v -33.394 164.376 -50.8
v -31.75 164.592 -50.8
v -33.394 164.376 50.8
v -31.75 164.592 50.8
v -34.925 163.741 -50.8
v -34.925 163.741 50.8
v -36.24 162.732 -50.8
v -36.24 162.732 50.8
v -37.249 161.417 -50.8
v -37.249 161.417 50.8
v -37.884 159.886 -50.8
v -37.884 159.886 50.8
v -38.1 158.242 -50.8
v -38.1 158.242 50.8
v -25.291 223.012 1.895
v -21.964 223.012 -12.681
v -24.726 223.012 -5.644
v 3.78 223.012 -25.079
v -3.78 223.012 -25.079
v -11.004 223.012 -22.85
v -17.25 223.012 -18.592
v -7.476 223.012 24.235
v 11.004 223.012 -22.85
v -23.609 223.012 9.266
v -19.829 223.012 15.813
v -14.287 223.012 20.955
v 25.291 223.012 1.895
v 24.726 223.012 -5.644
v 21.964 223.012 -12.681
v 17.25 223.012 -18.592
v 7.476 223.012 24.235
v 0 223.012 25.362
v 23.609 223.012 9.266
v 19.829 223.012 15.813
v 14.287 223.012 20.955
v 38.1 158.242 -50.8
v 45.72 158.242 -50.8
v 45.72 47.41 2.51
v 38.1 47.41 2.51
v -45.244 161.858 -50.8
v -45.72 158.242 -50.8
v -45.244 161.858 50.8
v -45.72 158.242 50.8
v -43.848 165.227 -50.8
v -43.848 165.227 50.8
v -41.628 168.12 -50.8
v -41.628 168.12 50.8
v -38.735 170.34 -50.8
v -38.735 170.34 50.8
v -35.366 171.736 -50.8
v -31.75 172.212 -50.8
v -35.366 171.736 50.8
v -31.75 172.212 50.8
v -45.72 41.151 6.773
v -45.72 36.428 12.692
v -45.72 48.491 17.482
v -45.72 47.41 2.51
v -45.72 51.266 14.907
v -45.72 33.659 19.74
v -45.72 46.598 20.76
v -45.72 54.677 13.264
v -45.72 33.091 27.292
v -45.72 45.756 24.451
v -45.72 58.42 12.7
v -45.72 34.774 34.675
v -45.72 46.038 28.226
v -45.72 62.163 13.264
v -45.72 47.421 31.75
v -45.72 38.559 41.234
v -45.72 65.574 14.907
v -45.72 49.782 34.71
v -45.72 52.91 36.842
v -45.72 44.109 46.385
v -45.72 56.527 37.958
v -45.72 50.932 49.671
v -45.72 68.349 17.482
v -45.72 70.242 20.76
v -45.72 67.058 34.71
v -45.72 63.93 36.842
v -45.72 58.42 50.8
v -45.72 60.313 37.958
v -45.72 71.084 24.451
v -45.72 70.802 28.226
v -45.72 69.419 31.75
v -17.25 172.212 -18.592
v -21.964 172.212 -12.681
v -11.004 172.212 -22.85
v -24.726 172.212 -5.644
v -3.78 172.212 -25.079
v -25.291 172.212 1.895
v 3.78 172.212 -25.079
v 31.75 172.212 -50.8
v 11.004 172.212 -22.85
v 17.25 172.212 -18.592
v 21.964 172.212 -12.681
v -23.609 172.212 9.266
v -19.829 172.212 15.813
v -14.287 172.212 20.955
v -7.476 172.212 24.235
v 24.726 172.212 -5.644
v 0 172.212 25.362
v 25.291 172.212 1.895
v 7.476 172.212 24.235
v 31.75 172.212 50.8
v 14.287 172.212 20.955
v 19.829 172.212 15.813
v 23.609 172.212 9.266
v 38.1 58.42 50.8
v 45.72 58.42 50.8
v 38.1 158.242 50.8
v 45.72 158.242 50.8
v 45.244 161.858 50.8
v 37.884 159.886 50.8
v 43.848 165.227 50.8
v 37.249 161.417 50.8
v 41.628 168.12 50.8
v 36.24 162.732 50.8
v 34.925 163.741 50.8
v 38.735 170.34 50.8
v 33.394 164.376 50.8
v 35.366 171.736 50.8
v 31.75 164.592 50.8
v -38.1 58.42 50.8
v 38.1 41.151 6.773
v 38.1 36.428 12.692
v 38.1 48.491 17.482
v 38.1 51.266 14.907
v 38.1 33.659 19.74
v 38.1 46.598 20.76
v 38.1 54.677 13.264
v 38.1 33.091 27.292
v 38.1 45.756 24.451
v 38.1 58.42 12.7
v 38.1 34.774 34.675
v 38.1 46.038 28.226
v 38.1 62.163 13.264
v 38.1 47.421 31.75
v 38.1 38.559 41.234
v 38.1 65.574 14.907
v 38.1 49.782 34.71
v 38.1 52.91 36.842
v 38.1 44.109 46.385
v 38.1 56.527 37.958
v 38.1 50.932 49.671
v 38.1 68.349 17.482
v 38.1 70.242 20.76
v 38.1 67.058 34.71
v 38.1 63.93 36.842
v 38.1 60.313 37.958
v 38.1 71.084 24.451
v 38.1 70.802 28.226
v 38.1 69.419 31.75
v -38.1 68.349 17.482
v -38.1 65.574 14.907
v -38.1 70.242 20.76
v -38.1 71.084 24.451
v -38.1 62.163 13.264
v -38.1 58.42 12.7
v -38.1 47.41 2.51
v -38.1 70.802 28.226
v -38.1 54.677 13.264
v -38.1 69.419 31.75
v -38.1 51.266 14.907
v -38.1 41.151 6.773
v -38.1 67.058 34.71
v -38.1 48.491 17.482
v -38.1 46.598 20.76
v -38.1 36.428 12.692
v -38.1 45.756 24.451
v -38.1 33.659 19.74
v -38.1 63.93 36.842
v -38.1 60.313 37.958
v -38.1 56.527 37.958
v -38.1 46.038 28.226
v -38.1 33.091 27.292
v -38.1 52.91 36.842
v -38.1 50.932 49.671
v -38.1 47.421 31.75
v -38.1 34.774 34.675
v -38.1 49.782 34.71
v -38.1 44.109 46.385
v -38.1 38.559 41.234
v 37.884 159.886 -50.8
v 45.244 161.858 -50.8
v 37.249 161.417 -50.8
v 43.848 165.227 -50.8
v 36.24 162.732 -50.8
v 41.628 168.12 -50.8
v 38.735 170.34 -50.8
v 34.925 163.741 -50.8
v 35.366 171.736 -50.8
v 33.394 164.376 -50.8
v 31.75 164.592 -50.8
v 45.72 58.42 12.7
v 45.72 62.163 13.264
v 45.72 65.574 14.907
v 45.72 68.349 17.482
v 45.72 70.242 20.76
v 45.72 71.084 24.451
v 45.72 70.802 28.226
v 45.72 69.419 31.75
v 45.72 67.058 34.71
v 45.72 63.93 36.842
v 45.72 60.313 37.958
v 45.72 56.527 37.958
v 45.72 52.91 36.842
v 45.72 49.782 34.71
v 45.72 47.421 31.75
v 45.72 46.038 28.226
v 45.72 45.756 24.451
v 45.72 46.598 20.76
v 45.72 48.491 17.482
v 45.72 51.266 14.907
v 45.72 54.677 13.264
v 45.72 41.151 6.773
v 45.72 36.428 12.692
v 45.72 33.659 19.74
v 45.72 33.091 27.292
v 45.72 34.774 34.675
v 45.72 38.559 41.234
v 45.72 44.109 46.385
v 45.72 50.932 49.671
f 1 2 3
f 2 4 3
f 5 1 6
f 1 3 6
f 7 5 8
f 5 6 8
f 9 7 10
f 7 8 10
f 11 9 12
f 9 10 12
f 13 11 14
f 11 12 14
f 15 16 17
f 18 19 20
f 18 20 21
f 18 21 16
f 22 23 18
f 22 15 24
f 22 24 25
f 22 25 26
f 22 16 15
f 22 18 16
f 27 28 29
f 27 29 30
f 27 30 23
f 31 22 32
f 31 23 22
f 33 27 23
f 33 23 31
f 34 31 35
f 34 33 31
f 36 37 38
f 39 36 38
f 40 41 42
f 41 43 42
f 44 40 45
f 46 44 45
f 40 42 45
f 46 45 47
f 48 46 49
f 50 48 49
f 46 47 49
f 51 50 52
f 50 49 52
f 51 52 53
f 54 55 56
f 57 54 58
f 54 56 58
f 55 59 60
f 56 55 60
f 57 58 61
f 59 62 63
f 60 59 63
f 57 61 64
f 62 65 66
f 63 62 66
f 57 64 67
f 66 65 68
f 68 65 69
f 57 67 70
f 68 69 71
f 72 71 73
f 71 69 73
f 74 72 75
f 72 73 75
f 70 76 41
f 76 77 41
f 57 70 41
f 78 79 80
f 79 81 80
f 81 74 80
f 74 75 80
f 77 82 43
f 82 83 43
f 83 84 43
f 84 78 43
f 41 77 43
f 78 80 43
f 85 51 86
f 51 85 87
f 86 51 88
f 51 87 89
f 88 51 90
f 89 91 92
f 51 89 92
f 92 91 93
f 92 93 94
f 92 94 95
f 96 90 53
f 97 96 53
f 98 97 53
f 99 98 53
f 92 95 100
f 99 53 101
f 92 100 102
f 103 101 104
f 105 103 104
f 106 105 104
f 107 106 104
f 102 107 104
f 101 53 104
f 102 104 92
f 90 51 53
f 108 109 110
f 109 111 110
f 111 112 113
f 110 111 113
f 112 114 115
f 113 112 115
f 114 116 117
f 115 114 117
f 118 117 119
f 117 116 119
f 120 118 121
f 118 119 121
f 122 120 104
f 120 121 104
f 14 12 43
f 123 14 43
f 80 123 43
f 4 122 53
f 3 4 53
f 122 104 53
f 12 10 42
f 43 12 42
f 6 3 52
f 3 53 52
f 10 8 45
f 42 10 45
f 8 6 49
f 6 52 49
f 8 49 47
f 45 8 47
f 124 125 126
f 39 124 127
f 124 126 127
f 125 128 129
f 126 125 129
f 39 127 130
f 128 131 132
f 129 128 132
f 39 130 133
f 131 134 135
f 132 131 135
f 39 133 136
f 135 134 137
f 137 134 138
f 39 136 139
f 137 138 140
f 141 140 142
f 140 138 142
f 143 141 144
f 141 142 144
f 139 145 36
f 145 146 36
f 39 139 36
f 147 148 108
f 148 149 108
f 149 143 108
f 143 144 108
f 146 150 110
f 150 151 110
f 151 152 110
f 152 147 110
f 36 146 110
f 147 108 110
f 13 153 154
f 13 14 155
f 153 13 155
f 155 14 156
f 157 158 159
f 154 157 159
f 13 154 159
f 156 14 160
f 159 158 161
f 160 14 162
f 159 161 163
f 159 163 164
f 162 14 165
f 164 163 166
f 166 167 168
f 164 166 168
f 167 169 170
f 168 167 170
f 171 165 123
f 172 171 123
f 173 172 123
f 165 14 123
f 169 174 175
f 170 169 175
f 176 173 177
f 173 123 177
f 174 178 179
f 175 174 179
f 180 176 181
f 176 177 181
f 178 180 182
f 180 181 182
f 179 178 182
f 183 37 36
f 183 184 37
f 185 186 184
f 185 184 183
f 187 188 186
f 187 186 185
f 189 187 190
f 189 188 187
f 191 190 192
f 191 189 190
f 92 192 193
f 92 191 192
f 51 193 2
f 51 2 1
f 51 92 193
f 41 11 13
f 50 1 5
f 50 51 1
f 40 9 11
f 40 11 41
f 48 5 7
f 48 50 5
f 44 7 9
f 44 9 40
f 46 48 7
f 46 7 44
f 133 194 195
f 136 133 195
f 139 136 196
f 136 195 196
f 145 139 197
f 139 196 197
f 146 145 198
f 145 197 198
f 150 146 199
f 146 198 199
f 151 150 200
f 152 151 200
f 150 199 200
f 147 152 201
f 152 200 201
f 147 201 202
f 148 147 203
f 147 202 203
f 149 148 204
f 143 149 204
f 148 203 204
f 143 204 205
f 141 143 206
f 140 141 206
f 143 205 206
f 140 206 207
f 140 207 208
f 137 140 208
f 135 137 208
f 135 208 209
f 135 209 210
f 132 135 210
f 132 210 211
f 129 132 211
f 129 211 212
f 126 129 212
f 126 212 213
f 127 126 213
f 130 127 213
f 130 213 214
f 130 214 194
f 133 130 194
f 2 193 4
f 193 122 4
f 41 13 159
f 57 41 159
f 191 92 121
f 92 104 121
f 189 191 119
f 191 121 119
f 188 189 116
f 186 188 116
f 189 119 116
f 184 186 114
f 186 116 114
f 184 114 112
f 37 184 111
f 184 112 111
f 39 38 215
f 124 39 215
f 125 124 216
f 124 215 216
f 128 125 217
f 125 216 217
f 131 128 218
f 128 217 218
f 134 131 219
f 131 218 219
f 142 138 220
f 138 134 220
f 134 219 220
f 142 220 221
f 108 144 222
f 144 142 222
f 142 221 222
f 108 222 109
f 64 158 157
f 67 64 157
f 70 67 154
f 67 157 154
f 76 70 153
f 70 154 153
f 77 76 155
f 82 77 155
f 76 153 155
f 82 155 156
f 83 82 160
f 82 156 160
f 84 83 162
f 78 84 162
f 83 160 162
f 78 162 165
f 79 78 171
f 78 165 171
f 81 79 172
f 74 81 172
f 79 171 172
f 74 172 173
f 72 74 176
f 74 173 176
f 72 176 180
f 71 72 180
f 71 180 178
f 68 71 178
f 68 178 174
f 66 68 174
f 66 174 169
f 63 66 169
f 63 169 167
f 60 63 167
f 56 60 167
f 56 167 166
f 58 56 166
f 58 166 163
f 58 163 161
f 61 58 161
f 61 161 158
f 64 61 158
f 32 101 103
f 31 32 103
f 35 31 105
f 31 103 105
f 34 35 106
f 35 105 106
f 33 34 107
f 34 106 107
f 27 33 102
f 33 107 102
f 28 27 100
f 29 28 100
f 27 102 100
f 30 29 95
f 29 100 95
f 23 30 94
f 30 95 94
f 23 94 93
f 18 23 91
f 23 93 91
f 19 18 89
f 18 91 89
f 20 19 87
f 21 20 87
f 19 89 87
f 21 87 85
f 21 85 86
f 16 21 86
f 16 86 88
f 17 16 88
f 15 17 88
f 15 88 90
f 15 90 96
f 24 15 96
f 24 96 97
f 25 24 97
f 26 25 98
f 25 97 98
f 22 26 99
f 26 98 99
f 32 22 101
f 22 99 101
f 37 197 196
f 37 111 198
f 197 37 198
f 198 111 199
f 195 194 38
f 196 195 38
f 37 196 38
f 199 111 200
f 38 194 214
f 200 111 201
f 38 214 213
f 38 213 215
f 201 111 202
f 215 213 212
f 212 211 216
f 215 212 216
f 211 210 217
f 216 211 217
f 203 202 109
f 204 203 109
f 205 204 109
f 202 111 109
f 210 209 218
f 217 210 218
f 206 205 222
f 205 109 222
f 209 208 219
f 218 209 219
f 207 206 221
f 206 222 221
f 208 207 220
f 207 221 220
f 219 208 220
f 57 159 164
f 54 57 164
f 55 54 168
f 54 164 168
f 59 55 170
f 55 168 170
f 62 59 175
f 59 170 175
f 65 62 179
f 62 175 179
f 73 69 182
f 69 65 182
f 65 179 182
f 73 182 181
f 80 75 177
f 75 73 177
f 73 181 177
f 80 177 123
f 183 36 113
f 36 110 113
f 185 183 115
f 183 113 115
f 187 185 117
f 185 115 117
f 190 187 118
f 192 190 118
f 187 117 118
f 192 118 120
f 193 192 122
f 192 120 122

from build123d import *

# Parameters (mm, degrees)
BASE_FLANGE1_DEPTH  = 50.8
SKETCH8_R           = 12.7
CUT_EXTRUDE2_DEPTH  = 202.491653782
SKETCH9_R           = 25.36182522
BOSS_EXTRUDE1_DEPTH = 50.8


# Sheet-metal steps are written as plain solids
with BuildPart() as part:
    # Sketch2 → Base-Flange1 (new, symmetric)
    with BuildSketch(Plane.XY):
        with BuildLine():
            Line((38.1, 0), (38.1, 158.242))
            ThreePointArc((38.1, 158.242), (36.240128061, 162.732128061), (31.75, 164.592))
            Line((31.75, 164.592), (-31.75, 164.592))
            ThreePointArc((-31.75, 164.592), (-36.240128061, 162.732128061), (-38.1, 158.242))
            Line((-38.1, 158.242), (-38.1, 0))
            Line((-38.1, 0), (-45.72, 0))
            Line((-45.72, 0), (-45.72, 158.242))
            ThreePointArc((-45.72, 158.242), (-41.628281733, 168.120281733), (-31.75, 172.212))
            Line((-31.75, 172.212), (31.75, 172.212))
            ThreePointArc((31.75, 172.212), (41.628281733, 168.120281733), (45.72, 158.242))
            Line((45.72, 158.242), (45.72, 0))
            Line((45.72, 0), (38.1, 0))
        make_face()
    extrude(amount=BASE_FLANGE1_DEPTH, both=True)

    # Sketch8 → Cut-Extrude2 (cut, through all)
    with BuildSketch(Plane(origin=(45.72, 0, 0), x_dir=(0, 0, -1), z_dir=(1, 0, 0))):
        with BuildLine():
            Line((50.8, 0), (50.8, 158.242))
            Line((50.8, 158.242), (-2.510257588, 47.410018515))
            ThreePointArc((-2.510257588, 47.410018515), (-31.046261716, 33.655514771), (-50.8, 58.42))
            Line((-50.8, 58.42), (-50.8, 0))
            Line((-50.8, 0), (50.8, 0))
        make_face()
        with Locations((-25.4, 58.42)):
            Circle(SKETCH8_R)
    extrude(amount=-CUT_EXTRUDE2_DEPTH, mode=Mode.SUBTRACT)

    # Sketch9 → Boss-Extrude1 (add)
    with BuildSketch(Plane(origin=(0, 172.212, 0), x_dir=(1, 0, 0), z_dir=(0, 1, 0))):
        with Locations(Location((0, 0, 0), (0, 0, 270))):
            Circle(SKETCH9_R)
    extrude(amount=BOSS_EXTRUDE1_DEPTH)


solid = part.part
